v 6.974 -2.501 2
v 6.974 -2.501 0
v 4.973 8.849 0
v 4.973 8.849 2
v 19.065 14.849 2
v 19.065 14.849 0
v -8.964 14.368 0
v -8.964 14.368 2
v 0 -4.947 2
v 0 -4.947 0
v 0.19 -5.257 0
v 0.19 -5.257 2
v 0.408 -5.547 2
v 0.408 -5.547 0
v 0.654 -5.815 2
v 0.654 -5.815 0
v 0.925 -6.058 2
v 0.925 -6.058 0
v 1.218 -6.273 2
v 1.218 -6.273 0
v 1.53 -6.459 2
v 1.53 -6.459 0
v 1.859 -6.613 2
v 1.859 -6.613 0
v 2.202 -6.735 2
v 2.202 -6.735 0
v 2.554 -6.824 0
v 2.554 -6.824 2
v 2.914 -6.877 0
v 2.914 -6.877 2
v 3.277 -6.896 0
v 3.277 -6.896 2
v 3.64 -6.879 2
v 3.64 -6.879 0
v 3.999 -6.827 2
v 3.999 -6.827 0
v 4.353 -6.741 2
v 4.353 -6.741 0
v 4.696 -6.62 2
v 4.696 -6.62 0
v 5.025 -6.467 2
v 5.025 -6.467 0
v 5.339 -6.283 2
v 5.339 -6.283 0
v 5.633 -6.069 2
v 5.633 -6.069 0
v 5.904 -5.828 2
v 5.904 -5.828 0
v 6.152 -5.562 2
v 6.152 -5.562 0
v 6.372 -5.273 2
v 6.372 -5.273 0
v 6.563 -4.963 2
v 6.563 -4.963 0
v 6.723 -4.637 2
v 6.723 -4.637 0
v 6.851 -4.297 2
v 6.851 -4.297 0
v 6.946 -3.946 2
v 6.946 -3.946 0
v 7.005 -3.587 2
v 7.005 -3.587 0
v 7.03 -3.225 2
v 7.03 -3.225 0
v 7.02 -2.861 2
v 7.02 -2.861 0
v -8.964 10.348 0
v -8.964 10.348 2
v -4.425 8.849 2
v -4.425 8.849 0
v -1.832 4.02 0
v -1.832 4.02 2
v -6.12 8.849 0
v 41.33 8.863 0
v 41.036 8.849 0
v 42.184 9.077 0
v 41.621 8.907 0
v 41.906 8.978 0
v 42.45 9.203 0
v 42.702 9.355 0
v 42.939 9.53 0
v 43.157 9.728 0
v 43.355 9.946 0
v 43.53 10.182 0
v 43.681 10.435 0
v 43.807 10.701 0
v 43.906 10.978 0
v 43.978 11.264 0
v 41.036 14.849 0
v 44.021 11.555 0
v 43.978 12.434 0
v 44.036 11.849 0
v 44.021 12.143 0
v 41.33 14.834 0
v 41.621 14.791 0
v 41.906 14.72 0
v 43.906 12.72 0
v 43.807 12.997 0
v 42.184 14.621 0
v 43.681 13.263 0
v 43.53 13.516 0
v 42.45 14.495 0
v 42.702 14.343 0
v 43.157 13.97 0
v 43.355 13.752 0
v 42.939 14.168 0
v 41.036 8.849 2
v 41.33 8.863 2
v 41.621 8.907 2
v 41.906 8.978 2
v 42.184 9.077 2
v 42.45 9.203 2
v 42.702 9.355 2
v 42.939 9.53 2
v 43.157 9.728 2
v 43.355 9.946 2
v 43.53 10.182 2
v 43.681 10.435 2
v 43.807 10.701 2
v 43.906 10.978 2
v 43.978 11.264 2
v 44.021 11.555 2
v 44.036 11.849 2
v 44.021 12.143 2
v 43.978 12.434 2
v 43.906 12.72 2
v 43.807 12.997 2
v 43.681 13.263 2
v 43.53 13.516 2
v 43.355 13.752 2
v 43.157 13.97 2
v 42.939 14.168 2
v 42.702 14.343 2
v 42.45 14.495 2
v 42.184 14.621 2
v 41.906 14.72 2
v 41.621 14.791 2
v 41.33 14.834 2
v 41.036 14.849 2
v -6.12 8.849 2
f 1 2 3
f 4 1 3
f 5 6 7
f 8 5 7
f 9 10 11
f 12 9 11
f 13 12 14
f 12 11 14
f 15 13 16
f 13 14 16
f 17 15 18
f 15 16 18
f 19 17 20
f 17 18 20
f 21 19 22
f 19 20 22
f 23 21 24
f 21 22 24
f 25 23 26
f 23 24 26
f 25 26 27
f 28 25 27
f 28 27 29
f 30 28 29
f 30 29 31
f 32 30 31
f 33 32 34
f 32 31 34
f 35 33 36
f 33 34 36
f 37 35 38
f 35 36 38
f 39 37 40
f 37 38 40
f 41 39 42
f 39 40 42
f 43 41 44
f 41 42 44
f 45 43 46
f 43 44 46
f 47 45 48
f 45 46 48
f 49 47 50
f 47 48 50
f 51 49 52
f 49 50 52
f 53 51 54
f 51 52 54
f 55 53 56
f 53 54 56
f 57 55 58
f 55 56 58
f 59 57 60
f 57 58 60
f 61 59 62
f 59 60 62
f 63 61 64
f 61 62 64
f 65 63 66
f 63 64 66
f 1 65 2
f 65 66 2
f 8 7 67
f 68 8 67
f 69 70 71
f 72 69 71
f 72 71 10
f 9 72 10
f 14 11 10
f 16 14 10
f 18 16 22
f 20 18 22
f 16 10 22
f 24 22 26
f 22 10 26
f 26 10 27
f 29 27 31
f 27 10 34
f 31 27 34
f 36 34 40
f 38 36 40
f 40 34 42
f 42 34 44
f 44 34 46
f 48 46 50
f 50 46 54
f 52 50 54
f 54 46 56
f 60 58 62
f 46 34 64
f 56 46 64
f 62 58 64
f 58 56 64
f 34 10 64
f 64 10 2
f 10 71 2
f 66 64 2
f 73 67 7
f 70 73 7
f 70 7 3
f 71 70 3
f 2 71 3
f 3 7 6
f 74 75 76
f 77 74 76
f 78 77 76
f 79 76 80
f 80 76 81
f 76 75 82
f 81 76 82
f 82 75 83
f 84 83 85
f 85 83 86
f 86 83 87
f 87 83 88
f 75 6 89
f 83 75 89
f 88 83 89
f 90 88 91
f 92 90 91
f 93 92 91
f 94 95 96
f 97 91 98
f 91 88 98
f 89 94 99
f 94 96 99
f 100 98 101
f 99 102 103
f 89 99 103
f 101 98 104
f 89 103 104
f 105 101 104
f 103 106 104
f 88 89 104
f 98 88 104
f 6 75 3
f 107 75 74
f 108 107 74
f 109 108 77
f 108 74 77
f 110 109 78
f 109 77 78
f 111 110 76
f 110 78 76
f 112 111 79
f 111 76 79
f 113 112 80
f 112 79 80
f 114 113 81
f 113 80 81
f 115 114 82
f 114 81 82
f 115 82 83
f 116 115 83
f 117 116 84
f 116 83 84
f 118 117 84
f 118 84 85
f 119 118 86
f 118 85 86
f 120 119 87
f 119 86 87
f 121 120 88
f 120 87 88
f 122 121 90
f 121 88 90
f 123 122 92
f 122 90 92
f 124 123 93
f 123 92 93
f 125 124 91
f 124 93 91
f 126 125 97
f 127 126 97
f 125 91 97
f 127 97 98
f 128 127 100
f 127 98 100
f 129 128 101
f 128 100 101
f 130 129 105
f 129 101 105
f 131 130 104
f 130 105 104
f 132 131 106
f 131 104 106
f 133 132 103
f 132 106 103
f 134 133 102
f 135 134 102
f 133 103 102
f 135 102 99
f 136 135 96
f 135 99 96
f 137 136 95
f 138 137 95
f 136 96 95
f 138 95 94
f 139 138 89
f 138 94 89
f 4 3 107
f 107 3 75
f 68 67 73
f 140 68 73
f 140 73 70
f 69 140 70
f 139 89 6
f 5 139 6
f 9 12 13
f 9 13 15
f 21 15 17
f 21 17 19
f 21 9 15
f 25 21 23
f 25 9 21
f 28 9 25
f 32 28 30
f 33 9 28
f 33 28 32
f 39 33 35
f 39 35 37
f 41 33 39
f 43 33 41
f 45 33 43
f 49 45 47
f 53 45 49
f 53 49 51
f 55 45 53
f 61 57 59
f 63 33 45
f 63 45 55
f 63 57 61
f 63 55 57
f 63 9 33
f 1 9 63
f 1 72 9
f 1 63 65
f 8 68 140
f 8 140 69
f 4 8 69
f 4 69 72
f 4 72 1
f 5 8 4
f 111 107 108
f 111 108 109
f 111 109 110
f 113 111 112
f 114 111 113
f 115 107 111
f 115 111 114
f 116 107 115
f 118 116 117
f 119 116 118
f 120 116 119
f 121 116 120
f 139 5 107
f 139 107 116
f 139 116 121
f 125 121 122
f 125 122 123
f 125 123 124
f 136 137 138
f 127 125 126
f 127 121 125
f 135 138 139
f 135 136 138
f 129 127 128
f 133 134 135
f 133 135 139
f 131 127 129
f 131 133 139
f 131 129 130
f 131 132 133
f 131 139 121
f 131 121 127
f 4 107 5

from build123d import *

# Parameters (mm, degrees)
F1_DEPTH = 2


with BuildPart() as f1:
    # F0 (on Top) → F1 (new body)
    with BuildSketch(Plane.XY):
        with BuildLine():
            ThreePointArc((41.035574, 8.848914), (44.035574, 11.848914), (41.035574, 14.848914))
            Line((41.035574, 14.848914), (19.065223, 14.848914))
            Line((19.065223, 14.848914), (-8.964426, 14.368003))
            Line((-8.964426, 14.368003), (-8.964426, 10.348275))
            Line((-8.964426, 10.348275), (-6.120325, 8.848914))
            Line((-6.120325, 8.848914), (-4.4251, 8.848914))
            Line((-4.4251, 8.848914), (-1.831835, 4.020077))
            Line((-1.831835, 4.020077), (0, -4.946886))
            ThreePointArc((0, -4.946886), (4.5255, -6.684783), (6.973939, -2.500816))
            Line((6.973939, -2.500816), (4.972675, 8.848914))
            Line((4.972675, 8.848914), (41.035574, 8.848914))
        make_face()
    extrude(amount=F1_DEPTH)


solid = f1.part
